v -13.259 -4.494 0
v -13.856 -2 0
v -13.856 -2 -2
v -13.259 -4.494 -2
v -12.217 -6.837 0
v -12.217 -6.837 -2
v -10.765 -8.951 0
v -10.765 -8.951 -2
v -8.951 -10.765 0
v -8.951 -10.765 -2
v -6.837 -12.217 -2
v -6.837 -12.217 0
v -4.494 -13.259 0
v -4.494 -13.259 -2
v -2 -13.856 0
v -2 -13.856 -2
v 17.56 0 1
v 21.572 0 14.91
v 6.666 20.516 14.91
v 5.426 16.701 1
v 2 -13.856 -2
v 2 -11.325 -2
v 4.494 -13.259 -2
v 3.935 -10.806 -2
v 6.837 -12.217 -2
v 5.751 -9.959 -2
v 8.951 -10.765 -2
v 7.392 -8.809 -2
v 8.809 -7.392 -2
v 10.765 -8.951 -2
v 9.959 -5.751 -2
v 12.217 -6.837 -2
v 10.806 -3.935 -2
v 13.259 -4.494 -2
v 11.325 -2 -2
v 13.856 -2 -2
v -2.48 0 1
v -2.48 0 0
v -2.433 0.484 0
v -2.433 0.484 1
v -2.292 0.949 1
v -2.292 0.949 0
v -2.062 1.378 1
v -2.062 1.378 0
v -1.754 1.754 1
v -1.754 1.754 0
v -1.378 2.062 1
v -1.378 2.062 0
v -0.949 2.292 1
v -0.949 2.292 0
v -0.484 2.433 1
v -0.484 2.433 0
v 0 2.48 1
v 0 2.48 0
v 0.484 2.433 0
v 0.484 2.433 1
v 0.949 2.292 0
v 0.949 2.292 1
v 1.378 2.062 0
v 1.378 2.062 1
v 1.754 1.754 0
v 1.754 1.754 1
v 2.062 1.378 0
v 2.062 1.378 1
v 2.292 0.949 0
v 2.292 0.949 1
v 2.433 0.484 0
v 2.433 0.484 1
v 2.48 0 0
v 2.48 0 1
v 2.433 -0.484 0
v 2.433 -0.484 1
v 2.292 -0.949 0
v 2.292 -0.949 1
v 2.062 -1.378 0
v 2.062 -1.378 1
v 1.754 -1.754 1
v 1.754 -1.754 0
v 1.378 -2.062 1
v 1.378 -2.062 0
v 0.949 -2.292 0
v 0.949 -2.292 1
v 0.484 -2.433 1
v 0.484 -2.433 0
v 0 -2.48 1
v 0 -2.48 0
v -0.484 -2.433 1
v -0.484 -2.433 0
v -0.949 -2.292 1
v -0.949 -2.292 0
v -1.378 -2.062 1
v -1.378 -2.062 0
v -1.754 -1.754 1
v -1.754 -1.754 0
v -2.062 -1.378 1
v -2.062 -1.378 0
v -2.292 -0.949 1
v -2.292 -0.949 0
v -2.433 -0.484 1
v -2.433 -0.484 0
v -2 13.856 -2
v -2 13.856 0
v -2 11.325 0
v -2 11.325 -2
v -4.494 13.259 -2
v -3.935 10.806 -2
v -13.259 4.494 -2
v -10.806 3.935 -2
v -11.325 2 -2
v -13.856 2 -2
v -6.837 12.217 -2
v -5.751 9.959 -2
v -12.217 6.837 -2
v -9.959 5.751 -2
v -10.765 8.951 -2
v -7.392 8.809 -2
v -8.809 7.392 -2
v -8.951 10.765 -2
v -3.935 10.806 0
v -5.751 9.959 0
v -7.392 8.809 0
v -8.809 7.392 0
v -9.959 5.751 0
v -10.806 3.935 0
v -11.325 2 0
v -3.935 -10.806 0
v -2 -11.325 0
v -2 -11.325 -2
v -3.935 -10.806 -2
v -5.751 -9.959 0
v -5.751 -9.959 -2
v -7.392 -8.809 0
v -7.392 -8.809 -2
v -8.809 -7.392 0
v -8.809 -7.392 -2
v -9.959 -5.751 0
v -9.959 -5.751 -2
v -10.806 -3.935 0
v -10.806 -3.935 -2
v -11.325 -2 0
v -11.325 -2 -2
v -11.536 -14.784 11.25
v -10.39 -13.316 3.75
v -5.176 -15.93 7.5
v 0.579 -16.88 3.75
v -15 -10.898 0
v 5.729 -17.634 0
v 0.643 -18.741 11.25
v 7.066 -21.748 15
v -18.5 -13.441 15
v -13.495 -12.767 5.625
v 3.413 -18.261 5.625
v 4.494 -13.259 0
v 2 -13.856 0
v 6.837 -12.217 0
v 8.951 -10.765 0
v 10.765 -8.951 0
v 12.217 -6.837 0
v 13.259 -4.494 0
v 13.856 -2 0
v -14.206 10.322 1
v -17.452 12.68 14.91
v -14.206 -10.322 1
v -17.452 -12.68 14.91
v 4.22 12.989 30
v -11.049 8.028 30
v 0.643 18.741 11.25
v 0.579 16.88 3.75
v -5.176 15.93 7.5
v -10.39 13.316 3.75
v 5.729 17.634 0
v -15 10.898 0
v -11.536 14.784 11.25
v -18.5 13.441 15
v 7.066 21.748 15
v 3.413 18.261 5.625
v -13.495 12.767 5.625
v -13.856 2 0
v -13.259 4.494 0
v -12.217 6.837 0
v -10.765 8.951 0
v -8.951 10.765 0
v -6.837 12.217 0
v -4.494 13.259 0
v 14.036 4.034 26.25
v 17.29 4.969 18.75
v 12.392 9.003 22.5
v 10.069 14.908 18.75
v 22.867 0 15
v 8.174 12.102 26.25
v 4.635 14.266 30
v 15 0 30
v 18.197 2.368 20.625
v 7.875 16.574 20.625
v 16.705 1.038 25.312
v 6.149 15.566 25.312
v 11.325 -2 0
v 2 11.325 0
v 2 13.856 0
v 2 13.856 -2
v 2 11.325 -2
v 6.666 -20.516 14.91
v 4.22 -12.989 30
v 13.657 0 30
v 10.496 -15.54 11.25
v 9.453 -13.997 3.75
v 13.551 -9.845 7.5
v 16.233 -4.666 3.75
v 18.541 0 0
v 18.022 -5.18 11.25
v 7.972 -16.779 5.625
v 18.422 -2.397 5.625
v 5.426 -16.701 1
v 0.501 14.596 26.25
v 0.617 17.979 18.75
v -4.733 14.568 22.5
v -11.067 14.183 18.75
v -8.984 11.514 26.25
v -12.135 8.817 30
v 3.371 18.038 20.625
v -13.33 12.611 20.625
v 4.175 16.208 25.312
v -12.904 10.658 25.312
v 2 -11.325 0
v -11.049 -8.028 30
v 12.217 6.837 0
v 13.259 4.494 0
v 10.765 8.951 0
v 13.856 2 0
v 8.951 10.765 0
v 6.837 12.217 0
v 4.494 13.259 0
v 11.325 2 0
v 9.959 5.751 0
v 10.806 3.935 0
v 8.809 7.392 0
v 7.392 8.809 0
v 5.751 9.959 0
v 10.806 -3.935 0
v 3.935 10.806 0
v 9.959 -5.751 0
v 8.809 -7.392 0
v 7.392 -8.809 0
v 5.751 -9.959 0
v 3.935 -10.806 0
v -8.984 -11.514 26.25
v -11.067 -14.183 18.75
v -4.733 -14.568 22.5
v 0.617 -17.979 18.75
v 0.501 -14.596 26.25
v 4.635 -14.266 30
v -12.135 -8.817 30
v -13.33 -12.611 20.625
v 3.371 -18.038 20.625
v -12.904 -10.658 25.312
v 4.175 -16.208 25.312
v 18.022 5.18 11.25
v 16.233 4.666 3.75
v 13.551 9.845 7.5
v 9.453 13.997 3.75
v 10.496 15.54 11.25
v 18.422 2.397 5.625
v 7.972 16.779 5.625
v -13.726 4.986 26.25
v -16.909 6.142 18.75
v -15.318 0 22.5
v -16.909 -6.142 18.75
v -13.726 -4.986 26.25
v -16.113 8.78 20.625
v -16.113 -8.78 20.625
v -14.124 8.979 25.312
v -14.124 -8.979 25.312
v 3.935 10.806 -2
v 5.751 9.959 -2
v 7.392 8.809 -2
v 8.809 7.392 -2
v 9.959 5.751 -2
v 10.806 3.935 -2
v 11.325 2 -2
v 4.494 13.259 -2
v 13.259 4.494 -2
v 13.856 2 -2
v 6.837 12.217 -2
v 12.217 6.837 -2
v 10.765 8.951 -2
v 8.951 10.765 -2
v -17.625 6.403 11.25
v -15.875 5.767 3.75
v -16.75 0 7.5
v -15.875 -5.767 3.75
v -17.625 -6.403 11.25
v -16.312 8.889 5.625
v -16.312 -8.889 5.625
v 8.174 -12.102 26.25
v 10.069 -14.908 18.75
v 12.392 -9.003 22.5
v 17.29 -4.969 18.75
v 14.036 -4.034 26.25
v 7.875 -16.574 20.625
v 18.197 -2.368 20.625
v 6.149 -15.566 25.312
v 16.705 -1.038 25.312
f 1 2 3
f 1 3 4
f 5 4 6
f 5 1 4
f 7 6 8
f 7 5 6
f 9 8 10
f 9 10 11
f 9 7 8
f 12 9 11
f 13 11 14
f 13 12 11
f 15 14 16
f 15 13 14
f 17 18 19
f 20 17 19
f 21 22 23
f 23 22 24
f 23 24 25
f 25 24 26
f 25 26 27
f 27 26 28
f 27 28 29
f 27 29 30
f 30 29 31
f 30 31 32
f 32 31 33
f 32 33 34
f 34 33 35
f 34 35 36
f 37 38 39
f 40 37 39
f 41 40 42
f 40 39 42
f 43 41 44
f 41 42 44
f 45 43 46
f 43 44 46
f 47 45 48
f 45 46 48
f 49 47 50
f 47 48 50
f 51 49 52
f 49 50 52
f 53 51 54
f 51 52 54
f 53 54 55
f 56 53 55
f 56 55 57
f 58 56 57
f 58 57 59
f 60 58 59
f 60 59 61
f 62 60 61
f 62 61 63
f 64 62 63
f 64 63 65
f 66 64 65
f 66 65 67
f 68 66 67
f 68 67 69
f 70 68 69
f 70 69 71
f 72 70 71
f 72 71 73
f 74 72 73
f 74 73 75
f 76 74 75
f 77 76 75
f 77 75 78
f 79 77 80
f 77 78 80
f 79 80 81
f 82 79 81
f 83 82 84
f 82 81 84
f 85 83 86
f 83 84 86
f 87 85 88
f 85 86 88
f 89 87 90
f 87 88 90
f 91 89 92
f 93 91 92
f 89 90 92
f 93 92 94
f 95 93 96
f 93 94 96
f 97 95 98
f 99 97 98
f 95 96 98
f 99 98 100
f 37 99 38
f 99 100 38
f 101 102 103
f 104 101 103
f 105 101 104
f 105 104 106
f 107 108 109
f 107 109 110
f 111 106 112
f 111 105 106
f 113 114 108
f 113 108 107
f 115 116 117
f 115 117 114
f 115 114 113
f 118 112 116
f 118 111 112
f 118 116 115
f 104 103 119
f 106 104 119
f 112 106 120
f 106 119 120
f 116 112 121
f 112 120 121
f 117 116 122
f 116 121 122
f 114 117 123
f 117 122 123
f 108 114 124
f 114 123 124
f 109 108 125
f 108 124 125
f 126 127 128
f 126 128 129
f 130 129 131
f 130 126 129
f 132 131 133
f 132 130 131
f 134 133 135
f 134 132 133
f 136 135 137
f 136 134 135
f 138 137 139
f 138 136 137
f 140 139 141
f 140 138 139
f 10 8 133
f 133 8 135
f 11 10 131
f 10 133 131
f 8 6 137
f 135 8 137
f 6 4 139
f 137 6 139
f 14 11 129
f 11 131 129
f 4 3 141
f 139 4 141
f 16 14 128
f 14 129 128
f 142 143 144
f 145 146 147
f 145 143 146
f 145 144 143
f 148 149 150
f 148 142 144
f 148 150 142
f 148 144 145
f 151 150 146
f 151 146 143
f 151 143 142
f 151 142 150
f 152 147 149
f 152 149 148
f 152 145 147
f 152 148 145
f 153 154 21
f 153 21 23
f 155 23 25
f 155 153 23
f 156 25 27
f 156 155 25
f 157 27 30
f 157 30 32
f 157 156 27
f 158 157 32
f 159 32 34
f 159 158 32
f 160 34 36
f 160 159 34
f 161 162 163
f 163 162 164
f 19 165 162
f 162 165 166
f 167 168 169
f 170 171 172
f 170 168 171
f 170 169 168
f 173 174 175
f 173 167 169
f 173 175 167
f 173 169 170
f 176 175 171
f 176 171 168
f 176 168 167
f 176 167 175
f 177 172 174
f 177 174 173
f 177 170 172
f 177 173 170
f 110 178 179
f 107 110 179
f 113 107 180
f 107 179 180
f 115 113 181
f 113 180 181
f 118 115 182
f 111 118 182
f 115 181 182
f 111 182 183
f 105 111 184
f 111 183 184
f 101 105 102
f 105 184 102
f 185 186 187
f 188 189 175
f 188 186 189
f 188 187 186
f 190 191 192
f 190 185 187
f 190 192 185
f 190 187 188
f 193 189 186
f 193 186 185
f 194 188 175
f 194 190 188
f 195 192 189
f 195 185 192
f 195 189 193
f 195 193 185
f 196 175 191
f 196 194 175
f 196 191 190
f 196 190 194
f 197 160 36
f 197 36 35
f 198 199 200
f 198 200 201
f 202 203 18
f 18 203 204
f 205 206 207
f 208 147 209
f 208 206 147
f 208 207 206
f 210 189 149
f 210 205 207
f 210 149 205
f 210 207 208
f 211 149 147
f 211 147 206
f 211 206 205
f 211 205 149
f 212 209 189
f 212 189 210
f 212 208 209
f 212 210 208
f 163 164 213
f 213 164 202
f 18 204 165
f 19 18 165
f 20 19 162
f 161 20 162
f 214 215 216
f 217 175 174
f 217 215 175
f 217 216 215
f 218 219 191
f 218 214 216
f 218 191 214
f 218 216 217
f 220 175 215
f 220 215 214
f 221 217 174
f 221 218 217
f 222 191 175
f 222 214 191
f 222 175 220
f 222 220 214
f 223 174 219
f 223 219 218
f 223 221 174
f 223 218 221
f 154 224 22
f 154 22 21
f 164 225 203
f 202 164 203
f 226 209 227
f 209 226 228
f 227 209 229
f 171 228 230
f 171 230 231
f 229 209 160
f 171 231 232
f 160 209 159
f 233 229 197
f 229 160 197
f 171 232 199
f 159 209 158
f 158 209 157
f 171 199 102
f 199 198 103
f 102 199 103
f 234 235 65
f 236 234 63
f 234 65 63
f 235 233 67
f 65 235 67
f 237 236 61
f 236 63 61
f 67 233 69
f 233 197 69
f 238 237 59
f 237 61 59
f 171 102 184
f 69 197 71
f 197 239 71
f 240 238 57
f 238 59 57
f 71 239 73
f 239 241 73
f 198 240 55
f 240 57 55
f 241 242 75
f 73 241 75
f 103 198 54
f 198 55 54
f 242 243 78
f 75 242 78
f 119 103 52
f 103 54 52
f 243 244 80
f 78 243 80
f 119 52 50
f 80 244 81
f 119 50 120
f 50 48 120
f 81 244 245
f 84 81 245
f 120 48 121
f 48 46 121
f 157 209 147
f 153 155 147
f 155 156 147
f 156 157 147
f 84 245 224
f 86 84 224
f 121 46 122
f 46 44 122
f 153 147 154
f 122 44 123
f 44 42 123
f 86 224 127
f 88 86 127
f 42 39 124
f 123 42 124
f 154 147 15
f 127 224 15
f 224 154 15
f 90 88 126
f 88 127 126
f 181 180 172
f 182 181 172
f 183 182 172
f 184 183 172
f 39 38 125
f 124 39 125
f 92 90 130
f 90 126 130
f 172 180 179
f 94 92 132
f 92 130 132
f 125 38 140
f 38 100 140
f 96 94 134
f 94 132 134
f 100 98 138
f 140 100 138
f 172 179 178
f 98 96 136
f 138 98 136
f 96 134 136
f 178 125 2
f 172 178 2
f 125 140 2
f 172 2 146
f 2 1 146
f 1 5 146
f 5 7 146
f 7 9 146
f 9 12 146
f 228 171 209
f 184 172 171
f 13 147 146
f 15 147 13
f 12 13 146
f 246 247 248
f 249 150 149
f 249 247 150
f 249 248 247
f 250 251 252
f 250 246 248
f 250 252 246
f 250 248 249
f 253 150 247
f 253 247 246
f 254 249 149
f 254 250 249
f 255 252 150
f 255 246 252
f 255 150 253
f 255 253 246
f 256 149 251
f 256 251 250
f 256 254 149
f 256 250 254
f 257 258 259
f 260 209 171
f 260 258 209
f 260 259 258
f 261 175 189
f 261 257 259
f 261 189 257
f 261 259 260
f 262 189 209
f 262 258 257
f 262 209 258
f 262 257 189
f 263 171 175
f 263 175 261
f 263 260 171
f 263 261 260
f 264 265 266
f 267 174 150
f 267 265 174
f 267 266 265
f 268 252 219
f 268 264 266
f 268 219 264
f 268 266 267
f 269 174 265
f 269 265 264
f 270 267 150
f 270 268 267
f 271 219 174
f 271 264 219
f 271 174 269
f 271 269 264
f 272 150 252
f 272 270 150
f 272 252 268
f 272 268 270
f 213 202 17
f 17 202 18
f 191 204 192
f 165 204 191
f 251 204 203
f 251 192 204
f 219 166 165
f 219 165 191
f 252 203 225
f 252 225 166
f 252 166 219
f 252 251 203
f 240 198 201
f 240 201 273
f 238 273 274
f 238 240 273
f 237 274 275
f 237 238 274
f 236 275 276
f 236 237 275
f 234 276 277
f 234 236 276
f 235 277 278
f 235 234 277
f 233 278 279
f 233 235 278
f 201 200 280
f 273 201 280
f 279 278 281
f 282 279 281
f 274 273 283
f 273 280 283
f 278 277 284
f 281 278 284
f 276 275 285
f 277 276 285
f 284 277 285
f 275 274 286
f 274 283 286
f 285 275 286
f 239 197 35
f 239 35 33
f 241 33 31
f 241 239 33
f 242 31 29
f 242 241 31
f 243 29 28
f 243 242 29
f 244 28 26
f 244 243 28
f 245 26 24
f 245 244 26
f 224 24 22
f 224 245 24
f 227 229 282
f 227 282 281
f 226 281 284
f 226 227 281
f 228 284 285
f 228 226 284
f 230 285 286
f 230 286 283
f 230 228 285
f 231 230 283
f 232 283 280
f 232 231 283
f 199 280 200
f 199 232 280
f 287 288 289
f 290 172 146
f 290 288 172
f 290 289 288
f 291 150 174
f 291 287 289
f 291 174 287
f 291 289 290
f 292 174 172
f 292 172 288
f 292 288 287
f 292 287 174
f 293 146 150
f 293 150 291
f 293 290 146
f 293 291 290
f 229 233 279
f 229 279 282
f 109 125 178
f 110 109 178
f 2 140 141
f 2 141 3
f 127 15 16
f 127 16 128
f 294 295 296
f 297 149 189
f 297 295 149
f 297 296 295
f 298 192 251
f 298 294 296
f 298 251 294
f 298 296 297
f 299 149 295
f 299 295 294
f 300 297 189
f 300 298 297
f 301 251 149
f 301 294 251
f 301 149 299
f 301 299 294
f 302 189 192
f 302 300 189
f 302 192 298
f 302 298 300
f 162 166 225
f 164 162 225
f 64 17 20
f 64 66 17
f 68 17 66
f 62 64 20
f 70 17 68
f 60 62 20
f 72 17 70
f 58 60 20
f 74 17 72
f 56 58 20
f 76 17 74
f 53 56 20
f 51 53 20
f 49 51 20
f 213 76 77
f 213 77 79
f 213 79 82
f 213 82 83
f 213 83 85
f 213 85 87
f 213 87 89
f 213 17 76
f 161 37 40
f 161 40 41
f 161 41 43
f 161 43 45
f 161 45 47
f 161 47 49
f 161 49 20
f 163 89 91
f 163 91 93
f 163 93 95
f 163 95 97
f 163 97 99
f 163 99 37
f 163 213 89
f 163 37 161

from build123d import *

# Parameters (mm, degrees)
VACIADO1_T              = -1
CROQUIS6_R              = 2.480361355
CORTAR_EXTRUIR1_DEPTH   = 10
SALIENTE_EXTRUIR1_DEPTH = 2


with BuildPart() as part:
    # Croquis2 → Recubrir1 section 0
    with BuildSketch(Plane.XY):
        with BuildLine():
            Line((18.541019662, 0), (5.729490169, 17.633557569))
            Line((5.729490169, 17.633557569), (-15, 10.89813792))
            Line((-15, 10.89813792), (-15, -10.89813792))
            Line((-15, -10.89813792), (5.729490169, -17.633557569))
            Line((5.729490169, -17.633557569), (18.541019662, 0))
        make_face()
    # Croquis3 → Recubrir1 section 1
    with BuildSketch(Plane.XY.offset(15)):
        with BuildLine():
            Line((22.867257584, 0), (7.066371208, 21.748054335))
            Line((7.066371208, 21.748054335), (-18.5, 13.441036768))
            Line((-18.5, 13.441036768), (-18.5, -13.441036768))
            Line((-18.5, -13.441036768), (7.066371208, -21.748054335))
            Line((7.066371208, -21.748054335), (22.867257584, 0))
        make_face()
    loft()

    # Croquis4 → section 1 of recubrir2
    with BuildSketch(Plane.XY.offset(30), mode=Mode.PRIVATE) as recubrir2_s1:
        with BuildLine():
            Line((15, 0), (4.635254916, 14.265847744))
            Line((4.635254916, 14.265847744), (-12.135254916, 8.816778784))
            Line((-12.135254916, 8.816778784), (-12.135254916, -8.816778784))
            Line((-12.135254916, -8.816778784), (4.635254916, -14.265847744))
            Line((4.635254916, -14.265847744), (15, 0))
        make_face()
    # loft from a face of the part (recubrir2)
    loft([part.faces().sort_by_distance((0, 0, 15))[0], recubrir2_s1.sketch])

    # Vaciado1
    vaciado1_openings = [part.faces().sort_by_distance(p)[0] for p in [
        (0, 0, 30),
    ]]
    offset(amount=VACIADO1_T, openings=vaciado1_openings, kind=Kind.INTERSECTION)

    # Croquis6 → Cortar-Extruir1 (cut)
    with BuildSketch(Plane(origin=(0, 0, 0), x_dir=(-1, 0, 0), z_dir=(0, 0, -1))):
        Circle(CROQUIS6_R)
    extrude(amount=-CORTAR_EXTRUIR1_DEPTH, mode=Mode.SUBTRACT)

    # Croquis7 → Saliente-Extruir1 (add)
    with BuildSketch(Plane(origin=(0, 0, 0), x_dir=(-1, 0, 0), z_dir=(0, 0, -1))):
        with BuildLine():
            Line((-2, 13.856406461), (-2, 11.324751653))
            ThreePointArc((-2, 11.324751653), (-8.131727984, 8.131727984), (-11.324751653, 2))
            Line((-11.324751653, 2), (-13.856406461, 2))
            ThreePointArc((-13.856406461, 2), (-9.899494937, 9.899494937), (-2, 13.856406461))
        make_face()
        with BuildLine():
            Line((2, 13.856406461), (2, 11.324751653))
            ThreePointArc((2, 11.324751653), (8.131727984, 8.131727984), (11.324751653, 2))
            Line((11.324751653, 2), (13.856406461, 2))
            ThreePointArc((13.856406461, 2), (9.899494937, 9.899494937), (2, 13.856406461))
        make_face()
        with BuildLine():
            Line((-13.856406461, -2), (-11.324751653, -2))
            ThreePointArc((-11.324751653, -2), (-8.131727984, -8.131727984), (-2, -11.324751653))
            Line((-2, -11.324751653), (-2, -13.856406461))
            ThreePointArc((-2, -13.856406461), (-9.899494937, -9.899494937), (-13.856406461, -2))
        make_face()
        with BuildLine():
            Line((11.324751653, -2), (13.856406461, -2))
            ThreePointArc((13.856406461, -2), (9.899494937, -9.899494937), (2, -13.856406461))
            Line((2, -13.856406461), (2, -11.324751653))
            ThreePointArc((2, -11.324751653), (8.131727984, -8.131727984), (11.324751653, -2))
        make_face()
    extrude(amount=SALIENTE_EXTRUIR1_DEPTH)


solid = part.part
